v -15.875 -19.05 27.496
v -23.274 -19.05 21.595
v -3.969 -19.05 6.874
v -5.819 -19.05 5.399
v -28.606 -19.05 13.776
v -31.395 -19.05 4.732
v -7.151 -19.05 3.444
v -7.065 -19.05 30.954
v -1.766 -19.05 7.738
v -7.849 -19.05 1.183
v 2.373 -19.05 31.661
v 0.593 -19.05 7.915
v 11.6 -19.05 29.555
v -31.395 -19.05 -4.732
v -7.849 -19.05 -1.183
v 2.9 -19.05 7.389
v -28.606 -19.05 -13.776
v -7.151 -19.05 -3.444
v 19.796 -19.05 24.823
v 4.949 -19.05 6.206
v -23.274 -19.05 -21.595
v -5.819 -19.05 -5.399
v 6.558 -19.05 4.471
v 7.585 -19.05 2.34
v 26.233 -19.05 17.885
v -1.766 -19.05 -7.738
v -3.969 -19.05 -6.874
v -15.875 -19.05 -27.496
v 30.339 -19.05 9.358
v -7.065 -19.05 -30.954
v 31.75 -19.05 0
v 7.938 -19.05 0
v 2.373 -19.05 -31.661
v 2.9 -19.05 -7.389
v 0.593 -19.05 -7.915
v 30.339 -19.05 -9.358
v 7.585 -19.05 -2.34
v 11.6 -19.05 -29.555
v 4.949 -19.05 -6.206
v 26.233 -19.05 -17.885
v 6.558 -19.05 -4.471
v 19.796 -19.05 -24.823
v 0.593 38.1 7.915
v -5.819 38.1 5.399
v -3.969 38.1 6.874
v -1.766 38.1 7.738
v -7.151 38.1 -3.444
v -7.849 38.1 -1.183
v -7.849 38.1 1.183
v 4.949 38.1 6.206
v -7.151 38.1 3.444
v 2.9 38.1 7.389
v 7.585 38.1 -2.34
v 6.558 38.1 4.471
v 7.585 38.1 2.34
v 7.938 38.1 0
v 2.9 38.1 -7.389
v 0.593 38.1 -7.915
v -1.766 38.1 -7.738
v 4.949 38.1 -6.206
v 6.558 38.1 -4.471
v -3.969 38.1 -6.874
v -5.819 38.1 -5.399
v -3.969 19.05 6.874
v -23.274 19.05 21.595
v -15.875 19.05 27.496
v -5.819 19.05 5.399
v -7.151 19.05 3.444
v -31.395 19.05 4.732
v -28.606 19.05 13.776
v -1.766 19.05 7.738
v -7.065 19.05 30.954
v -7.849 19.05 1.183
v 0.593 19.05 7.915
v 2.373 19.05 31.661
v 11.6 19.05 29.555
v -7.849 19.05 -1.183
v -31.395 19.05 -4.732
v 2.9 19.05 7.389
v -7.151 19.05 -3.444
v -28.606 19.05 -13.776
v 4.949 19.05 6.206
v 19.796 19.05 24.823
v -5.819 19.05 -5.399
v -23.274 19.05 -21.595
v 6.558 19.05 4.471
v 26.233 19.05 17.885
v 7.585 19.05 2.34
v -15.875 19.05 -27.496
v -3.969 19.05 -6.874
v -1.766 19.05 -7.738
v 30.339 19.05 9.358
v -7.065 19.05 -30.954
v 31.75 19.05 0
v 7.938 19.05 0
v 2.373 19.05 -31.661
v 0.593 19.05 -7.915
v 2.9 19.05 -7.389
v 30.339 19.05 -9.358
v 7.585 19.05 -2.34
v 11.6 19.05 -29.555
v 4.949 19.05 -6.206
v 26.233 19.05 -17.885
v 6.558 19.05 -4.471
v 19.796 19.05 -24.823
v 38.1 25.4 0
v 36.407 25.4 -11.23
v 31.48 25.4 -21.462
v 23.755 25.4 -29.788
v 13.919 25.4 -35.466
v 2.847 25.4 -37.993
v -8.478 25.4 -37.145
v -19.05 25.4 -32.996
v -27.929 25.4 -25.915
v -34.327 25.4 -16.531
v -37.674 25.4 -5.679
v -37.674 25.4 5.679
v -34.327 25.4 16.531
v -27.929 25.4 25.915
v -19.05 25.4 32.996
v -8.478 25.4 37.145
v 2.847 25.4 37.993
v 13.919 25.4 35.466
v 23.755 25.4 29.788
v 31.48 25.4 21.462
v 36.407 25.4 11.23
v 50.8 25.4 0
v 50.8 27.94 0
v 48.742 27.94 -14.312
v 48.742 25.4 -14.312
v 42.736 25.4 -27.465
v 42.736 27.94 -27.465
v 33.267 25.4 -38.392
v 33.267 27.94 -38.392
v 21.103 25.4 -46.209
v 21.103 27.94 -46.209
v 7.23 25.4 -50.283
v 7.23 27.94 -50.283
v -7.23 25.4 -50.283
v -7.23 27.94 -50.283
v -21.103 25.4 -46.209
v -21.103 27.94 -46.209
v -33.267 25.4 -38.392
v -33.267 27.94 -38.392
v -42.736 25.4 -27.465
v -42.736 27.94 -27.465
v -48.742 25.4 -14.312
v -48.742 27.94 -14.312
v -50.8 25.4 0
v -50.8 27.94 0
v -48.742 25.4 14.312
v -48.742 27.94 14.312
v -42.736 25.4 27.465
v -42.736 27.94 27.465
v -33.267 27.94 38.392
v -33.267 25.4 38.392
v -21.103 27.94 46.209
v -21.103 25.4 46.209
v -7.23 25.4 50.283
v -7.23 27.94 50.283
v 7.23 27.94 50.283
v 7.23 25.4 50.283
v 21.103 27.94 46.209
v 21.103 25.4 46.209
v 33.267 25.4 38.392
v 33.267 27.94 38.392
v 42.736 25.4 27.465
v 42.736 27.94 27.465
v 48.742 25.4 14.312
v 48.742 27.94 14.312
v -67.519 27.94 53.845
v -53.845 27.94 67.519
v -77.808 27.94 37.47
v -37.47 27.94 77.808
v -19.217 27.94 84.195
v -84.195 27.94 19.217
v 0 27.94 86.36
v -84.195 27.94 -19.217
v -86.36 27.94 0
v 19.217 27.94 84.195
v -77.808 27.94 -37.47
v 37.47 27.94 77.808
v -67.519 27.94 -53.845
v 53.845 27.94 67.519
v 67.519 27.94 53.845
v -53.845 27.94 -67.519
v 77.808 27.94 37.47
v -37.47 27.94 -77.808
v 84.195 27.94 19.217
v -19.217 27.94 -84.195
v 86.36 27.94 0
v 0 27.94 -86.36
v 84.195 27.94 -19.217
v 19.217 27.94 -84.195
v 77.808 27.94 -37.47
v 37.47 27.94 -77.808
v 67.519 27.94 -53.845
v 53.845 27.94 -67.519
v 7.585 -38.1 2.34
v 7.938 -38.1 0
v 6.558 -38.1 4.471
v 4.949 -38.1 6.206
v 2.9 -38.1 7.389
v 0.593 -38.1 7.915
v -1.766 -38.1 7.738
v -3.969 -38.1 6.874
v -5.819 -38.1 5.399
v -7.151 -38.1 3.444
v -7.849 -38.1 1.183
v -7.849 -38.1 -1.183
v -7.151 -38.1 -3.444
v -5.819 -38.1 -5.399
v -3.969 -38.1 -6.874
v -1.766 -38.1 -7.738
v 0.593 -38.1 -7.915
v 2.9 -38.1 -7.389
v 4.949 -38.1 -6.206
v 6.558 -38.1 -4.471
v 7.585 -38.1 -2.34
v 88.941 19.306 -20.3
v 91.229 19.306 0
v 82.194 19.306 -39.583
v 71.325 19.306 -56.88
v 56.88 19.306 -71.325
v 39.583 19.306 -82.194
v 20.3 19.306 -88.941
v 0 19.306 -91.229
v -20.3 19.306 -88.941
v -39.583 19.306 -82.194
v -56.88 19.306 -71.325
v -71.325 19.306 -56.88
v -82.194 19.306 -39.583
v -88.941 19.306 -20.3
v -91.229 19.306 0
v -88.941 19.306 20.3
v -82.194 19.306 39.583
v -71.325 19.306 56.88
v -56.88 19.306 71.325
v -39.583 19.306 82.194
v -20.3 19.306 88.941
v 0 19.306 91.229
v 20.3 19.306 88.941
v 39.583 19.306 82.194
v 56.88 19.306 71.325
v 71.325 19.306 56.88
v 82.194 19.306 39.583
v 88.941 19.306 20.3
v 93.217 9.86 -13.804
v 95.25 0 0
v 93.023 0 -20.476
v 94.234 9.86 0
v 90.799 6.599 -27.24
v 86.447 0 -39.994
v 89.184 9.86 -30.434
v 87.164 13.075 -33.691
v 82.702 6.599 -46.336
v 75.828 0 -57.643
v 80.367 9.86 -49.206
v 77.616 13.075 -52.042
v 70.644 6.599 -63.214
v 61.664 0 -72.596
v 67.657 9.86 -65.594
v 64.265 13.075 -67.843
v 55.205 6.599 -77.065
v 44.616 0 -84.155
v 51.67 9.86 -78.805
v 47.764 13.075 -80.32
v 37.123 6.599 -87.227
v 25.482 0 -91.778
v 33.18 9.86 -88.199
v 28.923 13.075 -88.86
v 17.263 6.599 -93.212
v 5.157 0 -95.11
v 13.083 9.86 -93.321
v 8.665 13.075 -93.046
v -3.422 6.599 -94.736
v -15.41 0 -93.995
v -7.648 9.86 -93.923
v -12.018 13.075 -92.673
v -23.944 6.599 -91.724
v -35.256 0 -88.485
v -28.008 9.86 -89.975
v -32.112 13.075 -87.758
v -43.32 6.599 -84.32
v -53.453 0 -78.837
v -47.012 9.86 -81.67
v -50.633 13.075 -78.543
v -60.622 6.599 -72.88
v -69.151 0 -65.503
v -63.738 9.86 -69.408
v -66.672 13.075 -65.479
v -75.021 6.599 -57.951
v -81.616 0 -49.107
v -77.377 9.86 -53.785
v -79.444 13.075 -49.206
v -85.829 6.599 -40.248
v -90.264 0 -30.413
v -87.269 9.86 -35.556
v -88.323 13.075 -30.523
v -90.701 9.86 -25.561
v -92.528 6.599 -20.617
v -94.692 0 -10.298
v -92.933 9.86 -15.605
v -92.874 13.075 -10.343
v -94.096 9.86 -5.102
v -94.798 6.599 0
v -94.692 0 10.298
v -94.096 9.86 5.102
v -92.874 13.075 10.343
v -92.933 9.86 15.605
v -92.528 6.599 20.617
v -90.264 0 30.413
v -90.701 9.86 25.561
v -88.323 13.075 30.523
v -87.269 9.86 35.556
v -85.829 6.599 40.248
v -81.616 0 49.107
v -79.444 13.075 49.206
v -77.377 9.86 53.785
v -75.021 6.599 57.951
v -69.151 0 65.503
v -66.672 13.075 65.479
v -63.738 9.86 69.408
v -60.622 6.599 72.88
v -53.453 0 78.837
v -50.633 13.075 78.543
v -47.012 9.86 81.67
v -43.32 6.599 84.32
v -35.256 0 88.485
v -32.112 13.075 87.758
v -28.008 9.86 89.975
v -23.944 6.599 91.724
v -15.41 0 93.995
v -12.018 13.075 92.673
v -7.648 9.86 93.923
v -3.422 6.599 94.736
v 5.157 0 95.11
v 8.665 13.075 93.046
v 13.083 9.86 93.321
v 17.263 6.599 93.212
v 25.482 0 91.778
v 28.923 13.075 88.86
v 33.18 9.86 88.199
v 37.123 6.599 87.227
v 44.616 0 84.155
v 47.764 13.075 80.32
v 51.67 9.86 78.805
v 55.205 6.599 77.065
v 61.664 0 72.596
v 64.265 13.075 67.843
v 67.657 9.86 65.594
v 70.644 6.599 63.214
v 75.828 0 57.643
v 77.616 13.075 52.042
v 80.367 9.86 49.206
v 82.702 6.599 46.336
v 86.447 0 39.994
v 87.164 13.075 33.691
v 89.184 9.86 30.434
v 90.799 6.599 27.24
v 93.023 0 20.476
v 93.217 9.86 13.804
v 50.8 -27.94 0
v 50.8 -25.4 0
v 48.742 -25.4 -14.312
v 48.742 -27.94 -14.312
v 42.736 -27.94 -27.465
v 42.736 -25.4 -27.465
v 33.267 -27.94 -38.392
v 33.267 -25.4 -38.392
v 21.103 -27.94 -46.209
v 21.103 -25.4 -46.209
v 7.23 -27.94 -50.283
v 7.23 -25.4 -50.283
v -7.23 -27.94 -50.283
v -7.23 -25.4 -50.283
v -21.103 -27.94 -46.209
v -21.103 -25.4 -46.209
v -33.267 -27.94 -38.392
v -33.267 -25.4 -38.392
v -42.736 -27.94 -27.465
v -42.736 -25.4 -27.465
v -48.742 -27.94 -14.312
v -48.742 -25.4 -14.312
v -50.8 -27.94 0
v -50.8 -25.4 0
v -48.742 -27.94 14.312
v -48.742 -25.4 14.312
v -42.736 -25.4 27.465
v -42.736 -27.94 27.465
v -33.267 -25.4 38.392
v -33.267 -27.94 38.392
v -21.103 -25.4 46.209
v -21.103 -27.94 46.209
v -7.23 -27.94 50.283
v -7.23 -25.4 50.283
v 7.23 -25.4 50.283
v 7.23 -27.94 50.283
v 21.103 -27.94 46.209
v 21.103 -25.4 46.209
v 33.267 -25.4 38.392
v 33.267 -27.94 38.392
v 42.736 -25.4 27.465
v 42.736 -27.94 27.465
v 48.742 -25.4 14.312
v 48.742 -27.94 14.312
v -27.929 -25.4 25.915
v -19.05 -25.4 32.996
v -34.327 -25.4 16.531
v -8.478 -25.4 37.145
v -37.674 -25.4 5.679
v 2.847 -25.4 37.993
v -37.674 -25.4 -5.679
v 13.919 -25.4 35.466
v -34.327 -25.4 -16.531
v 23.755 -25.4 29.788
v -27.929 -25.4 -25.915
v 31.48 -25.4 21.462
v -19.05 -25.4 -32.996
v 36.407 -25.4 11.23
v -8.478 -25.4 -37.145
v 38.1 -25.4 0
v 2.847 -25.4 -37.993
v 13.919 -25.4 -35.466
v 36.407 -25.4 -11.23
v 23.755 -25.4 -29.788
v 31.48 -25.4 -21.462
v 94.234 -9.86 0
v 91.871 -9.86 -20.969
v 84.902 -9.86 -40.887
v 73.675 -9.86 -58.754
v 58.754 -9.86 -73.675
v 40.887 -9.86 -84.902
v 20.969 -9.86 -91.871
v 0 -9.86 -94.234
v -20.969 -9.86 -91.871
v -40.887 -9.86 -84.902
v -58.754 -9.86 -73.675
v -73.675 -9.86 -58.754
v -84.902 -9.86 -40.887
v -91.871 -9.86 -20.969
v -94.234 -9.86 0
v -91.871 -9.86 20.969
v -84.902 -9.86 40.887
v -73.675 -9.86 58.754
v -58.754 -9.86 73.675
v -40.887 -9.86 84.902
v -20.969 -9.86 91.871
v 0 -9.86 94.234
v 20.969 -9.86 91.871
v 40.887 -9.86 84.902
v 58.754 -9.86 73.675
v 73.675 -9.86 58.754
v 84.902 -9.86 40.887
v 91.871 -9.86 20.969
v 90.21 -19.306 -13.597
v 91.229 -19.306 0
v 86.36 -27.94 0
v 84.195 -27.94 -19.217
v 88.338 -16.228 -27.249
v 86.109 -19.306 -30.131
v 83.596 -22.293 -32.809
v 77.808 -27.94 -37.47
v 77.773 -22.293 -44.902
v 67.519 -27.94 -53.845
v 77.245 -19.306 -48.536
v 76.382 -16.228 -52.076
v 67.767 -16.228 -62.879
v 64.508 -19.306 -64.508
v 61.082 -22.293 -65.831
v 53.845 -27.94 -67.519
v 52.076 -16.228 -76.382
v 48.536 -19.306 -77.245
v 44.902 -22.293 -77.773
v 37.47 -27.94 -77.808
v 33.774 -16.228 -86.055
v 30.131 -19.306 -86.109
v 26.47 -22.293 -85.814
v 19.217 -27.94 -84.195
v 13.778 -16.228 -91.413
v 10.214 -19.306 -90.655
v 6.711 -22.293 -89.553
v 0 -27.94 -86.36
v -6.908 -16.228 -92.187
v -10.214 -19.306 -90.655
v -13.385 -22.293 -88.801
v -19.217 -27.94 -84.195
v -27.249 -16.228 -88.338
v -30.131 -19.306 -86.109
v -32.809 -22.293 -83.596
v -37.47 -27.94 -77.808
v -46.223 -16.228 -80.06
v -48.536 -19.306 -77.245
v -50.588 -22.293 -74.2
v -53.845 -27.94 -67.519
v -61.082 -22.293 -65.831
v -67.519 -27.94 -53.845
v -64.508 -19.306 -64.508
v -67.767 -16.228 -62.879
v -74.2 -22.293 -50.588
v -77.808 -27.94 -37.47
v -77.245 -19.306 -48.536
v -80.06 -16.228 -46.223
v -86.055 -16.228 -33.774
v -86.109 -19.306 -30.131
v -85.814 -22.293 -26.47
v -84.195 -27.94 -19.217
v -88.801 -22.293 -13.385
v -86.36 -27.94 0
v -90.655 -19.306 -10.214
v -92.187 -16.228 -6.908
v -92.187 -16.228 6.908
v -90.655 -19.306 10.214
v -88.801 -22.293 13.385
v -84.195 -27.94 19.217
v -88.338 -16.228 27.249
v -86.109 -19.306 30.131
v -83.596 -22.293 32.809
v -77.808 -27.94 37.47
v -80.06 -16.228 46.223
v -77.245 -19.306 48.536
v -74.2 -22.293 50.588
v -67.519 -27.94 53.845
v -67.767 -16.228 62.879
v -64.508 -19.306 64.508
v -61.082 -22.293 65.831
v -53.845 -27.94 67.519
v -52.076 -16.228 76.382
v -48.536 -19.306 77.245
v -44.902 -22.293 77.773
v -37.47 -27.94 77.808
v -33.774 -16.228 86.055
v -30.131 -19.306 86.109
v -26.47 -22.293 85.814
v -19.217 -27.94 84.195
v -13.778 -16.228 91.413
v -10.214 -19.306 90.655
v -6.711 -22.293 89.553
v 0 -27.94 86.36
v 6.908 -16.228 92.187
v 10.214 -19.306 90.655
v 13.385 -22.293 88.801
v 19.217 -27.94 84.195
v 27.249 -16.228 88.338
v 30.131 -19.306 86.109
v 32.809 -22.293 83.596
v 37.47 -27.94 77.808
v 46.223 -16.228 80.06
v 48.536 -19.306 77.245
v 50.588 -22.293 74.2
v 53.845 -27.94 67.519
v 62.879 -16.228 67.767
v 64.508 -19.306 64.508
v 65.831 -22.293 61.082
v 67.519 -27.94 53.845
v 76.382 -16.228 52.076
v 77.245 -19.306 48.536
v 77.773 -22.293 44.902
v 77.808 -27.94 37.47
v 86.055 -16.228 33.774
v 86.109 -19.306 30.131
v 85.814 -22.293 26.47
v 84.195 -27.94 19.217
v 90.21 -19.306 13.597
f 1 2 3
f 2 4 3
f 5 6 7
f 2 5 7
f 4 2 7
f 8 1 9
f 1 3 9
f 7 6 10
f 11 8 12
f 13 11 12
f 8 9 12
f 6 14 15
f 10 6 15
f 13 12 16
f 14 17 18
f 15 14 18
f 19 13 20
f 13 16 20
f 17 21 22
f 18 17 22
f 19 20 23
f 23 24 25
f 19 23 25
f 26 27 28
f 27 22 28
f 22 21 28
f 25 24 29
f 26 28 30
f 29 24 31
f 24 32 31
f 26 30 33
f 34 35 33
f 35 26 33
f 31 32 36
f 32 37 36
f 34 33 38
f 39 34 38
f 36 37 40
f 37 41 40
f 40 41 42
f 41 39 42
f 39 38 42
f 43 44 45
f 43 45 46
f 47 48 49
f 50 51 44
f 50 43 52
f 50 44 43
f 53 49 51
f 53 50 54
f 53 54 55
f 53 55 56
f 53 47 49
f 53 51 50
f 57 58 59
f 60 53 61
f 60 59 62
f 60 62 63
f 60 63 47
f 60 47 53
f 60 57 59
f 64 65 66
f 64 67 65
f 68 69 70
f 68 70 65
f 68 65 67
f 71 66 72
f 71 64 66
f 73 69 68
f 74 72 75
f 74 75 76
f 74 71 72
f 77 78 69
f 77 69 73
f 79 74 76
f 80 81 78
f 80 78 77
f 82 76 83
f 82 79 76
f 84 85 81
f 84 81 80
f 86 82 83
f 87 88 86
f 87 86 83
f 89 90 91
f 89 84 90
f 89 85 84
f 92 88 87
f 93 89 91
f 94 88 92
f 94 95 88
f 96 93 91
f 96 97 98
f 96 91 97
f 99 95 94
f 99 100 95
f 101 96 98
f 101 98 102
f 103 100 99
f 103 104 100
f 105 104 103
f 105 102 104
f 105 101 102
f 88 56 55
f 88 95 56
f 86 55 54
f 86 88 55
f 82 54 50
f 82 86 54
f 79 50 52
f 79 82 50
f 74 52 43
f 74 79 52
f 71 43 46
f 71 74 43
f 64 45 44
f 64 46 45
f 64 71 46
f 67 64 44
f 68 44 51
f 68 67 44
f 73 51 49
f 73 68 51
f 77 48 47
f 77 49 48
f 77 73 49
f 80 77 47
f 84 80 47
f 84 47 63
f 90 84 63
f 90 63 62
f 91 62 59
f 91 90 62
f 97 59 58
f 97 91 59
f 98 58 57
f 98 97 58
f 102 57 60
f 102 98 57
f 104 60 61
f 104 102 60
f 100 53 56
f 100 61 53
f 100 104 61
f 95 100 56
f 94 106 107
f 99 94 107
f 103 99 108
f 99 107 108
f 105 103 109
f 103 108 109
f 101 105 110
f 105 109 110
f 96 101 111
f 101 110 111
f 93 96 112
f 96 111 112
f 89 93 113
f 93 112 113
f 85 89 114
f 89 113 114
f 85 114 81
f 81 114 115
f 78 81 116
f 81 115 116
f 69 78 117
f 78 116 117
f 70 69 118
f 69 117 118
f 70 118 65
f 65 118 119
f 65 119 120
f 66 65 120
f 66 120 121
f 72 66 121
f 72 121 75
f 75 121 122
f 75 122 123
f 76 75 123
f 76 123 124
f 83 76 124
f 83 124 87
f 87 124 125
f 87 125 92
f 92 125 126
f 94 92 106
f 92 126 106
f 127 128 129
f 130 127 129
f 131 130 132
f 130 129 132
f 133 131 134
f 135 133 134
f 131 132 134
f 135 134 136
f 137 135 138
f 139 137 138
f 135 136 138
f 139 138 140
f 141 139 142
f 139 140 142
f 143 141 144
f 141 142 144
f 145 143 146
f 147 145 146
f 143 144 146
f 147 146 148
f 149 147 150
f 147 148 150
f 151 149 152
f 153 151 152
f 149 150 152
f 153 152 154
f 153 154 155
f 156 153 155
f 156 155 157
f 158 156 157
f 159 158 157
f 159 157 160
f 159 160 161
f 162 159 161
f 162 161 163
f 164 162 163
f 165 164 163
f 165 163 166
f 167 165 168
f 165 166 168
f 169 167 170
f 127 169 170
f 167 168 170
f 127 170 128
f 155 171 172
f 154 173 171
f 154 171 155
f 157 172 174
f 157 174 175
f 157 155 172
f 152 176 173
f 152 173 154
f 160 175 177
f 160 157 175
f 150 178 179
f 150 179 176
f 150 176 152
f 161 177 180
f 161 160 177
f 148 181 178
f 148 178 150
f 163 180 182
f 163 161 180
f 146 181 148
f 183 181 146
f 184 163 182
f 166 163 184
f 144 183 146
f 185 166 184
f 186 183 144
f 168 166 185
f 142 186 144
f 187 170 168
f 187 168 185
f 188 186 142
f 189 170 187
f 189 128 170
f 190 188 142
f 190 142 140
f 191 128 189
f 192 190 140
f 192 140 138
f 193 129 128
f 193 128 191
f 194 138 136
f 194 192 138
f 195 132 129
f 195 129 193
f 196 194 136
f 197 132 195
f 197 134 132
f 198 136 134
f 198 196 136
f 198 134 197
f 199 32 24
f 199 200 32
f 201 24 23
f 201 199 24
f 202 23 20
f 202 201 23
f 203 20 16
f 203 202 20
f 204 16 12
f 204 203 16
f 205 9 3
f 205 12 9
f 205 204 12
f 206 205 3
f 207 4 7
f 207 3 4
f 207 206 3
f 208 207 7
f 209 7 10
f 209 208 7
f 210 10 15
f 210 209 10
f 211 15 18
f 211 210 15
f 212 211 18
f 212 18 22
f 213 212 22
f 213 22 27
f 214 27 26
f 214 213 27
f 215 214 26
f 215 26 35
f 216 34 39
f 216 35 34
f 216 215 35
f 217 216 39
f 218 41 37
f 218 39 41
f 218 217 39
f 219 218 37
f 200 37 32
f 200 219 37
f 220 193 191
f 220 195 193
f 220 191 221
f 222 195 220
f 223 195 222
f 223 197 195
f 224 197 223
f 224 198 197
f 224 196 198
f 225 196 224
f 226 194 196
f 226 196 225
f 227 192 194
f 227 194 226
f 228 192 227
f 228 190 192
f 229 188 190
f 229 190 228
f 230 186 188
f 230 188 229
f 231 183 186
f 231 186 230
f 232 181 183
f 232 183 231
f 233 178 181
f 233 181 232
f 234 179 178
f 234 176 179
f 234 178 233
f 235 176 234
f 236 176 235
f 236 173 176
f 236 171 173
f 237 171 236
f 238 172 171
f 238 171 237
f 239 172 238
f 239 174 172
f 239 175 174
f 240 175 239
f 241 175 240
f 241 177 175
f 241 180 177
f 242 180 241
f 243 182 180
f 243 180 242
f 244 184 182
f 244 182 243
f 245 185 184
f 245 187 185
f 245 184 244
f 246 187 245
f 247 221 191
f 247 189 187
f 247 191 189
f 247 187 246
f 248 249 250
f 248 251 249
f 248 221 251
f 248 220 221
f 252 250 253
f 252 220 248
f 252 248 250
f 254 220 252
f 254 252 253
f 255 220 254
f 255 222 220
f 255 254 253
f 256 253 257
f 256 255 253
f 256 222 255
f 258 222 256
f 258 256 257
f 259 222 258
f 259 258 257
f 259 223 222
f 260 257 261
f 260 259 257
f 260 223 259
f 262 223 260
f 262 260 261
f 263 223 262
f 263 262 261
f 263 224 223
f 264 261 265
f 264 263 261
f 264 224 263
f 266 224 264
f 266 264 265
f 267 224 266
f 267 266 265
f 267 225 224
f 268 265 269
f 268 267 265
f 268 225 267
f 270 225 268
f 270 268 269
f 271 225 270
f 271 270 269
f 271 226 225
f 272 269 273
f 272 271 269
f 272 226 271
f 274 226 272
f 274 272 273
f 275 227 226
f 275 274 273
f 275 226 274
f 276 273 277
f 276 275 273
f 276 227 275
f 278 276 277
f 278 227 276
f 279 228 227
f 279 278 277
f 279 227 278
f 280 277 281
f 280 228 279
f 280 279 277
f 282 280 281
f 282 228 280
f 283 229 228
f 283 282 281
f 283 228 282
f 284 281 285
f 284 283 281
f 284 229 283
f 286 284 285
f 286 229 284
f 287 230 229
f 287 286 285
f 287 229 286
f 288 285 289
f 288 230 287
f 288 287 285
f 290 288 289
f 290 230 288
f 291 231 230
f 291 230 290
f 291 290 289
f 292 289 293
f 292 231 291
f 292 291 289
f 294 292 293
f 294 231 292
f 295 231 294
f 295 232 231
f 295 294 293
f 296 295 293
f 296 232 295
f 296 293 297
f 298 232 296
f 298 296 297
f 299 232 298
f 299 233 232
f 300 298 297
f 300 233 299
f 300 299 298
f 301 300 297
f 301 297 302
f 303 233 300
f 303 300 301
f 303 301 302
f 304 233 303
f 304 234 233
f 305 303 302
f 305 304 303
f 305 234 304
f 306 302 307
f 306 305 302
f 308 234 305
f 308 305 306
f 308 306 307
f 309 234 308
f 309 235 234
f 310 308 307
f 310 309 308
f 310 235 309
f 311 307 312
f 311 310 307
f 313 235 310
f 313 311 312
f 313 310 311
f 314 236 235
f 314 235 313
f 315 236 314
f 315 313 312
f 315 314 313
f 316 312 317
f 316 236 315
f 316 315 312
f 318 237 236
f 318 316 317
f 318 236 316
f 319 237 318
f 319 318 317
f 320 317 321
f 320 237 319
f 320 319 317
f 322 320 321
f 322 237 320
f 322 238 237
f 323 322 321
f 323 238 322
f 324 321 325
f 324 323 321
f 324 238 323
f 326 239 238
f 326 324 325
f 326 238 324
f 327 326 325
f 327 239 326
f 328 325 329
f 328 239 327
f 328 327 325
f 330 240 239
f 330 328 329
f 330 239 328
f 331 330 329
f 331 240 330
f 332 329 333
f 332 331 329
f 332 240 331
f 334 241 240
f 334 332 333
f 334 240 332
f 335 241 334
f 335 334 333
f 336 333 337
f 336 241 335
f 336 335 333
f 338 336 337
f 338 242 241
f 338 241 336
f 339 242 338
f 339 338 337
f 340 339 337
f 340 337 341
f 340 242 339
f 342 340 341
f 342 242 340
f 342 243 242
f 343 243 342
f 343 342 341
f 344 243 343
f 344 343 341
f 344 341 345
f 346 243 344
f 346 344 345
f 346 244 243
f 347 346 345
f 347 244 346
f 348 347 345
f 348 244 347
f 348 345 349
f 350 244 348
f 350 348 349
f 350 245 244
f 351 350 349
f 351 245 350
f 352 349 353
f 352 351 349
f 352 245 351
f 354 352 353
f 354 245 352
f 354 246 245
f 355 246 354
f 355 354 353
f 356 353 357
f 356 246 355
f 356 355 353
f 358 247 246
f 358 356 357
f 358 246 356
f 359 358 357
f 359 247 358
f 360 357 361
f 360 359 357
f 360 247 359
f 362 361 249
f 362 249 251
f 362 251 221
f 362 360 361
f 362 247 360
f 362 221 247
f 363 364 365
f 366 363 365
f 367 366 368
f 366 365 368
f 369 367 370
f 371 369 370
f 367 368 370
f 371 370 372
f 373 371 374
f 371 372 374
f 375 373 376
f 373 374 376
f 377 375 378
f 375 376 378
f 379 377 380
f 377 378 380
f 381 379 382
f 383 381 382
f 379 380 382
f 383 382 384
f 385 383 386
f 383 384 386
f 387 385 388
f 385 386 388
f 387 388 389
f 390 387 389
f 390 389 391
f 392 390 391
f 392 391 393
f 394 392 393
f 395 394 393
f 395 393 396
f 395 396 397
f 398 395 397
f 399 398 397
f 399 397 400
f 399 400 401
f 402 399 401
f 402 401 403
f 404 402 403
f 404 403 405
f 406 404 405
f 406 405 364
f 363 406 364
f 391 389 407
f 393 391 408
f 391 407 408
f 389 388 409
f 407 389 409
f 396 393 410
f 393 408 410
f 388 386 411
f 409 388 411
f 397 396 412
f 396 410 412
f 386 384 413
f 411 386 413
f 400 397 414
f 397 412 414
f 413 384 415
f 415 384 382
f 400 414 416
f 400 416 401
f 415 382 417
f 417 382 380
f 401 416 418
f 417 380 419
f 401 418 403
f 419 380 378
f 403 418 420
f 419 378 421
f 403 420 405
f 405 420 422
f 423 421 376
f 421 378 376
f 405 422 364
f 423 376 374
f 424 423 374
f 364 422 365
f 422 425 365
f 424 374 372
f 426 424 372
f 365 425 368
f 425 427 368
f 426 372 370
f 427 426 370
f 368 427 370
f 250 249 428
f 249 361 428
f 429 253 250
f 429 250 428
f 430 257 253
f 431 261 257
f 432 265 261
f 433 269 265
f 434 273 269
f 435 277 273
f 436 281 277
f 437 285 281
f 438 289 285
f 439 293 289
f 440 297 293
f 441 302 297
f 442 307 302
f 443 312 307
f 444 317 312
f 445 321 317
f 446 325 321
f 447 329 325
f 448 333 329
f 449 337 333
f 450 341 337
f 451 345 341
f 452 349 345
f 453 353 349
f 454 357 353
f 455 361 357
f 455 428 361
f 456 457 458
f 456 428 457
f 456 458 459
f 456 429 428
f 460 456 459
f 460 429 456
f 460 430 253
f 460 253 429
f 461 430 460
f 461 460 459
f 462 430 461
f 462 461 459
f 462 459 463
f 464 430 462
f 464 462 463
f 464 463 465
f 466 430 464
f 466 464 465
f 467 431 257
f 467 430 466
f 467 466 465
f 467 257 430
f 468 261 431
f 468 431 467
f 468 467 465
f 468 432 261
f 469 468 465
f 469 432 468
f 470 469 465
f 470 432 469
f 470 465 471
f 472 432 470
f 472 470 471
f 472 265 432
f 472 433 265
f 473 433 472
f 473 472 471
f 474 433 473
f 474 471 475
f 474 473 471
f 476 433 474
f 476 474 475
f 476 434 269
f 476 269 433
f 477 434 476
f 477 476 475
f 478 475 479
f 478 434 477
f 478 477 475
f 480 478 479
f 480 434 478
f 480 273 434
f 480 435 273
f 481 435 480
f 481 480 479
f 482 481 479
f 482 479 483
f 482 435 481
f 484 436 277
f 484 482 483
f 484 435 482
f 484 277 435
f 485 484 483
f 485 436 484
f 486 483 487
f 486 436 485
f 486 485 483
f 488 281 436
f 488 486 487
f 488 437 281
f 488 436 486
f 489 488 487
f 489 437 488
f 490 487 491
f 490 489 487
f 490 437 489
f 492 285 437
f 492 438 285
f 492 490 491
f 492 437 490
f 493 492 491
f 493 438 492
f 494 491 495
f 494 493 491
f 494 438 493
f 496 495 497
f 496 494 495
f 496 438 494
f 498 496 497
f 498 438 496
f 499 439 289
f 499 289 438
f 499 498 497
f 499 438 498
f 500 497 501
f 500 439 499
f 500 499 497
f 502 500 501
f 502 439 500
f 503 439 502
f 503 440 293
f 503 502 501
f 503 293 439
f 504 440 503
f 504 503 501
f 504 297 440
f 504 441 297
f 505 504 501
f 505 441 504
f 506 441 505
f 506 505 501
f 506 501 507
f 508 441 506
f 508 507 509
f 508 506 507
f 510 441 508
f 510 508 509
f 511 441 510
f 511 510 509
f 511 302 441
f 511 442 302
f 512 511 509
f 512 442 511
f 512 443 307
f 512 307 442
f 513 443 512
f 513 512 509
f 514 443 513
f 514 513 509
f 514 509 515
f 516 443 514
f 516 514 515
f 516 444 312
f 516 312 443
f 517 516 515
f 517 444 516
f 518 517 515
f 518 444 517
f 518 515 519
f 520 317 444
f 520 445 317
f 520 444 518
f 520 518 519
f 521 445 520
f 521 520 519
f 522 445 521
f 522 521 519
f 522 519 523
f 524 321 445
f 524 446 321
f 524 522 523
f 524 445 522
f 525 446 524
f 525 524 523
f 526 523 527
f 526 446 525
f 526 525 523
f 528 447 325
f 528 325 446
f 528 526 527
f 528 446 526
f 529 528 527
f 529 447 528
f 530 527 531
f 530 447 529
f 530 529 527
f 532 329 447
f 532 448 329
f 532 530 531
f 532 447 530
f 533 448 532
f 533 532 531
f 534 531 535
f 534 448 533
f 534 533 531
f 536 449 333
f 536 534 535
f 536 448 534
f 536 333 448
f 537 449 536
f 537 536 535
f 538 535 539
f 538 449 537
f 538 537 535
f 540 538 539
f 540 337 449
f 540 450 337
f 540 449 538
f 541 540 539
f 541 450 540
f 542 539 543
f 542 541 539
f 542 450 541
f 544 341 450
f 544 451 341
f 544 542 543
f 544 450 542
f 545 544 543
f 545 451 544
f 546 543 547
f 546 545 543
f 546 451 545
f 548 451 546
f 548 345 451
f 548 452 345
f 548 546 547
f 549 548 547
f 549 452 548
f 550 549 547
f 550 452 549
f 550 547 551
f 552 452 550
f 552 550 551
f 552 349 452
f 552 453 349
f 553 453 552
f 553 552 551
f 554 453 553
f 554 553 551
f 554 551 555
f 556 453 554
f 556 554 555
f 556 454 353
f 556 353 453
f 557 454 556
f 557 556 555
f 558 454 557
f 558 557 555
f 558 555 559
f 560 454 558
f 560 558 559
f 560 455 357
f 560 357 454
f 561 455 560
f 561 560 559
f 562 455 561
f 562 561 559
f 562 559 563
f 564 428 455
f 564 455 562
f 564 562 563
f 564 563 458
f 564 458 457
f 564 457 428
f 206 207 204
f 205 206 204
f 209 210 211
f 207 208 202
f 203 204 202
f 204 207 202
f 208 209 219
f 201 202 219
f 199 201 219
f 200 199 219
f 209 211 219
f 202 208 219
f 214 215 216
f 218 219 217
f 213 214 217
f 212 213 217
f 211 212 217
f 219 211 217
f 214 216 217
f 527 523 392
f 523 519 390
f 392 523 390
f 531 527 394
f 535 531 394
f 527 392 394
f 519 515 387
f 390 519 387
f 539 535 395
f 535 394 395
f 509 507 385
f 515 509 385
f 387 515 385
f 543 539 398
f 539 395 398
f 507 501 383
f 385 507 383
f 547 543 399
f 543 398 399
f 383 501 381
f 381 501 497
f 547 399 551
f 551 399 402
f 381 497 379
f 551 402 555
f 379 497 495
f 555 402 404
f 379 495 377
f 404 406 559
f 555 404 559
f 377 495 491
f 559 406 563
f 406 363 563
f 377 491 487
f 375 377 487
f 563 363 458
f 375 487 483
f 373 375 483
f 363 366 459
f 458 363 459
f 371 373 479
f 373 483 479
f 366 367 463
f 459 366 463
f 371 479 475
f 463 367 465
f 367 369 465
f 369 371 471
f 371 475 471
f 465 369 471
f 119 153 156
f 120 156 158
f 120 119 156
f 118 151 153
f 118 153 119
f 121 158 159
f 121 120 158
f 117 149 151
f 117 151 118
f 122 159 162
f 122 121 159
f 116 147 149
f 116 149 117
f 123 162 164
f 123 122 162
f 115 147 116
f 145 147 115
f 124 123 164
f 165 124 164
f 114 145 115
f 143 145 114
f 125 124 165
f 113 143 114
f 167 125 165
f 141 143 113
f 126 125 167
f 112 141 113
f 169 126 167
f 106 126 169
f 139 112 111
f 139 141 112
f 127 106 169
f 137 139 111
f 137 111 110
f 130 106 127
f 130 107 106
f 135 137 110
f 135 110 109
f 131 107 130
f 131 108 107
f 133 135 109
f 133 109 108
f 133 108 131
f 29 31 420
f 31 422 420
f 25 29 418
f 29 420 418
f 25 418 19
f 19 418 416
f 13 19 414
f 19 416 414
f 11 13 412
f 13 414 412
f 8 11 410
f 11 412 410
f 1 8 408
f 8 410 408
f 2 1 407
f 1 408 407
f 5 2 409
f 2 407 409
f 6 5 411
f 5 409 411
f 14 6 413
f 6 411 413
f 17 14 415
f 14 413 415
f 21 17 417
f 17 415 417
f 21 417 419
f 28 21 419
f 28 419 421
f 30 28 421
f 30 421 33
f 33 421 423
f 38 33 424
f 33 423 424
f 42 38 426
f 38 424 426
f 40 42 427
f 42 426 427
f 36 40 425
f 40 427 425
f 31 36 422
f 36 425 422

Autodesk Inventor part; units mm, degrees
ref_plane "YZ Plane" through (0, 0, 0) normal (1, 0, 0) x (0, 1, 0)
ref_plane "XZ Plane" through (0, 0, 0) normal (0, 1, 0) x (-1, 0, 0)
ref_plane "XY Plane" through (0, 0, 0) normal (0, 0, 1) x (1, 0, 0)
sketch "Sketch1" plane through (0, 0, 0) normal (0, 0, 1) x (1, 0, 0)
  line L0 (0, 0) -> (0, 0)
  line L1 (95.25, 0) -> (95.25, 7.7978)
  line L2 (86.36, -27.94) -> (50.8, -27.94)
  line L3 (50.8, -27.94) -> (50.8, 27.94)
  line L4 (50.8, 27.94) -> (86.36, 27.94)
  line L5 (86.36, 27.94) -> (86.36, -27.94)
  line L6 (50.8, 25.4) -> (38.1, 25.4)
  line L7 (38.1, 25.4) -> (38.1, -25.4)
  line L8 (38.1, -25.4) -> (50.8, -25.4)
  line L9 (50.8, -25.4) -> (50.8, 25.4)
  line L10 (0, 19.05) -> (31.75, 19.05)
  line L11 (31.75, 19.05) -> (31.75, -19.05)
  line L12 (31.75, -19.05) -> (0, -19.05)
  line L13 (0, -19.05) -> (0, 19.05)
  line L14 (31.75, 19.05) -> (38.1, 25.4)
  line L15 (38.1, -25.4) -> (31.75, -19.05)
  line L16 (0, 7.7978) -> (4.1037, 7.7978)
  line L17 (0, 38.1) -> (7.9375, 38.1)
  line L18 (7.9375, 38.1) -> (7.9375, -38.1)
  line L19 (7.9375, -38.1) -> (0, -38.1)
  line L20 (0, -38.1) -> (0, 38.1)
  arc A0 (86.36, -27.94) -> (86.36, 27.94) centre (46.8993, 0) ccw
  point P0 (50.8, 0)
  point P1 (38.1, 0)
  point P2 (31.75, 0)
  point P3 (50.8, 0)
  dimension "d0" = 95.25
  dimension "d2" = 35.56
  dimension "d3" = 50.8
  dimension "d4" = 50.8
  dimension "d5" = 12.7
  dimension "d6" = 38.1
  dimension "d7" = 6.35
  dimension "d8" = 76.2
  dimension "d9" = 7.9375
  dimension "d10" = 55.88
revolve "Revolution1" add sketch "Sketch1" angle 360 about axis through (0, -38.1, 0) along (0, 1, 0)
properties part number "caster wheel"
